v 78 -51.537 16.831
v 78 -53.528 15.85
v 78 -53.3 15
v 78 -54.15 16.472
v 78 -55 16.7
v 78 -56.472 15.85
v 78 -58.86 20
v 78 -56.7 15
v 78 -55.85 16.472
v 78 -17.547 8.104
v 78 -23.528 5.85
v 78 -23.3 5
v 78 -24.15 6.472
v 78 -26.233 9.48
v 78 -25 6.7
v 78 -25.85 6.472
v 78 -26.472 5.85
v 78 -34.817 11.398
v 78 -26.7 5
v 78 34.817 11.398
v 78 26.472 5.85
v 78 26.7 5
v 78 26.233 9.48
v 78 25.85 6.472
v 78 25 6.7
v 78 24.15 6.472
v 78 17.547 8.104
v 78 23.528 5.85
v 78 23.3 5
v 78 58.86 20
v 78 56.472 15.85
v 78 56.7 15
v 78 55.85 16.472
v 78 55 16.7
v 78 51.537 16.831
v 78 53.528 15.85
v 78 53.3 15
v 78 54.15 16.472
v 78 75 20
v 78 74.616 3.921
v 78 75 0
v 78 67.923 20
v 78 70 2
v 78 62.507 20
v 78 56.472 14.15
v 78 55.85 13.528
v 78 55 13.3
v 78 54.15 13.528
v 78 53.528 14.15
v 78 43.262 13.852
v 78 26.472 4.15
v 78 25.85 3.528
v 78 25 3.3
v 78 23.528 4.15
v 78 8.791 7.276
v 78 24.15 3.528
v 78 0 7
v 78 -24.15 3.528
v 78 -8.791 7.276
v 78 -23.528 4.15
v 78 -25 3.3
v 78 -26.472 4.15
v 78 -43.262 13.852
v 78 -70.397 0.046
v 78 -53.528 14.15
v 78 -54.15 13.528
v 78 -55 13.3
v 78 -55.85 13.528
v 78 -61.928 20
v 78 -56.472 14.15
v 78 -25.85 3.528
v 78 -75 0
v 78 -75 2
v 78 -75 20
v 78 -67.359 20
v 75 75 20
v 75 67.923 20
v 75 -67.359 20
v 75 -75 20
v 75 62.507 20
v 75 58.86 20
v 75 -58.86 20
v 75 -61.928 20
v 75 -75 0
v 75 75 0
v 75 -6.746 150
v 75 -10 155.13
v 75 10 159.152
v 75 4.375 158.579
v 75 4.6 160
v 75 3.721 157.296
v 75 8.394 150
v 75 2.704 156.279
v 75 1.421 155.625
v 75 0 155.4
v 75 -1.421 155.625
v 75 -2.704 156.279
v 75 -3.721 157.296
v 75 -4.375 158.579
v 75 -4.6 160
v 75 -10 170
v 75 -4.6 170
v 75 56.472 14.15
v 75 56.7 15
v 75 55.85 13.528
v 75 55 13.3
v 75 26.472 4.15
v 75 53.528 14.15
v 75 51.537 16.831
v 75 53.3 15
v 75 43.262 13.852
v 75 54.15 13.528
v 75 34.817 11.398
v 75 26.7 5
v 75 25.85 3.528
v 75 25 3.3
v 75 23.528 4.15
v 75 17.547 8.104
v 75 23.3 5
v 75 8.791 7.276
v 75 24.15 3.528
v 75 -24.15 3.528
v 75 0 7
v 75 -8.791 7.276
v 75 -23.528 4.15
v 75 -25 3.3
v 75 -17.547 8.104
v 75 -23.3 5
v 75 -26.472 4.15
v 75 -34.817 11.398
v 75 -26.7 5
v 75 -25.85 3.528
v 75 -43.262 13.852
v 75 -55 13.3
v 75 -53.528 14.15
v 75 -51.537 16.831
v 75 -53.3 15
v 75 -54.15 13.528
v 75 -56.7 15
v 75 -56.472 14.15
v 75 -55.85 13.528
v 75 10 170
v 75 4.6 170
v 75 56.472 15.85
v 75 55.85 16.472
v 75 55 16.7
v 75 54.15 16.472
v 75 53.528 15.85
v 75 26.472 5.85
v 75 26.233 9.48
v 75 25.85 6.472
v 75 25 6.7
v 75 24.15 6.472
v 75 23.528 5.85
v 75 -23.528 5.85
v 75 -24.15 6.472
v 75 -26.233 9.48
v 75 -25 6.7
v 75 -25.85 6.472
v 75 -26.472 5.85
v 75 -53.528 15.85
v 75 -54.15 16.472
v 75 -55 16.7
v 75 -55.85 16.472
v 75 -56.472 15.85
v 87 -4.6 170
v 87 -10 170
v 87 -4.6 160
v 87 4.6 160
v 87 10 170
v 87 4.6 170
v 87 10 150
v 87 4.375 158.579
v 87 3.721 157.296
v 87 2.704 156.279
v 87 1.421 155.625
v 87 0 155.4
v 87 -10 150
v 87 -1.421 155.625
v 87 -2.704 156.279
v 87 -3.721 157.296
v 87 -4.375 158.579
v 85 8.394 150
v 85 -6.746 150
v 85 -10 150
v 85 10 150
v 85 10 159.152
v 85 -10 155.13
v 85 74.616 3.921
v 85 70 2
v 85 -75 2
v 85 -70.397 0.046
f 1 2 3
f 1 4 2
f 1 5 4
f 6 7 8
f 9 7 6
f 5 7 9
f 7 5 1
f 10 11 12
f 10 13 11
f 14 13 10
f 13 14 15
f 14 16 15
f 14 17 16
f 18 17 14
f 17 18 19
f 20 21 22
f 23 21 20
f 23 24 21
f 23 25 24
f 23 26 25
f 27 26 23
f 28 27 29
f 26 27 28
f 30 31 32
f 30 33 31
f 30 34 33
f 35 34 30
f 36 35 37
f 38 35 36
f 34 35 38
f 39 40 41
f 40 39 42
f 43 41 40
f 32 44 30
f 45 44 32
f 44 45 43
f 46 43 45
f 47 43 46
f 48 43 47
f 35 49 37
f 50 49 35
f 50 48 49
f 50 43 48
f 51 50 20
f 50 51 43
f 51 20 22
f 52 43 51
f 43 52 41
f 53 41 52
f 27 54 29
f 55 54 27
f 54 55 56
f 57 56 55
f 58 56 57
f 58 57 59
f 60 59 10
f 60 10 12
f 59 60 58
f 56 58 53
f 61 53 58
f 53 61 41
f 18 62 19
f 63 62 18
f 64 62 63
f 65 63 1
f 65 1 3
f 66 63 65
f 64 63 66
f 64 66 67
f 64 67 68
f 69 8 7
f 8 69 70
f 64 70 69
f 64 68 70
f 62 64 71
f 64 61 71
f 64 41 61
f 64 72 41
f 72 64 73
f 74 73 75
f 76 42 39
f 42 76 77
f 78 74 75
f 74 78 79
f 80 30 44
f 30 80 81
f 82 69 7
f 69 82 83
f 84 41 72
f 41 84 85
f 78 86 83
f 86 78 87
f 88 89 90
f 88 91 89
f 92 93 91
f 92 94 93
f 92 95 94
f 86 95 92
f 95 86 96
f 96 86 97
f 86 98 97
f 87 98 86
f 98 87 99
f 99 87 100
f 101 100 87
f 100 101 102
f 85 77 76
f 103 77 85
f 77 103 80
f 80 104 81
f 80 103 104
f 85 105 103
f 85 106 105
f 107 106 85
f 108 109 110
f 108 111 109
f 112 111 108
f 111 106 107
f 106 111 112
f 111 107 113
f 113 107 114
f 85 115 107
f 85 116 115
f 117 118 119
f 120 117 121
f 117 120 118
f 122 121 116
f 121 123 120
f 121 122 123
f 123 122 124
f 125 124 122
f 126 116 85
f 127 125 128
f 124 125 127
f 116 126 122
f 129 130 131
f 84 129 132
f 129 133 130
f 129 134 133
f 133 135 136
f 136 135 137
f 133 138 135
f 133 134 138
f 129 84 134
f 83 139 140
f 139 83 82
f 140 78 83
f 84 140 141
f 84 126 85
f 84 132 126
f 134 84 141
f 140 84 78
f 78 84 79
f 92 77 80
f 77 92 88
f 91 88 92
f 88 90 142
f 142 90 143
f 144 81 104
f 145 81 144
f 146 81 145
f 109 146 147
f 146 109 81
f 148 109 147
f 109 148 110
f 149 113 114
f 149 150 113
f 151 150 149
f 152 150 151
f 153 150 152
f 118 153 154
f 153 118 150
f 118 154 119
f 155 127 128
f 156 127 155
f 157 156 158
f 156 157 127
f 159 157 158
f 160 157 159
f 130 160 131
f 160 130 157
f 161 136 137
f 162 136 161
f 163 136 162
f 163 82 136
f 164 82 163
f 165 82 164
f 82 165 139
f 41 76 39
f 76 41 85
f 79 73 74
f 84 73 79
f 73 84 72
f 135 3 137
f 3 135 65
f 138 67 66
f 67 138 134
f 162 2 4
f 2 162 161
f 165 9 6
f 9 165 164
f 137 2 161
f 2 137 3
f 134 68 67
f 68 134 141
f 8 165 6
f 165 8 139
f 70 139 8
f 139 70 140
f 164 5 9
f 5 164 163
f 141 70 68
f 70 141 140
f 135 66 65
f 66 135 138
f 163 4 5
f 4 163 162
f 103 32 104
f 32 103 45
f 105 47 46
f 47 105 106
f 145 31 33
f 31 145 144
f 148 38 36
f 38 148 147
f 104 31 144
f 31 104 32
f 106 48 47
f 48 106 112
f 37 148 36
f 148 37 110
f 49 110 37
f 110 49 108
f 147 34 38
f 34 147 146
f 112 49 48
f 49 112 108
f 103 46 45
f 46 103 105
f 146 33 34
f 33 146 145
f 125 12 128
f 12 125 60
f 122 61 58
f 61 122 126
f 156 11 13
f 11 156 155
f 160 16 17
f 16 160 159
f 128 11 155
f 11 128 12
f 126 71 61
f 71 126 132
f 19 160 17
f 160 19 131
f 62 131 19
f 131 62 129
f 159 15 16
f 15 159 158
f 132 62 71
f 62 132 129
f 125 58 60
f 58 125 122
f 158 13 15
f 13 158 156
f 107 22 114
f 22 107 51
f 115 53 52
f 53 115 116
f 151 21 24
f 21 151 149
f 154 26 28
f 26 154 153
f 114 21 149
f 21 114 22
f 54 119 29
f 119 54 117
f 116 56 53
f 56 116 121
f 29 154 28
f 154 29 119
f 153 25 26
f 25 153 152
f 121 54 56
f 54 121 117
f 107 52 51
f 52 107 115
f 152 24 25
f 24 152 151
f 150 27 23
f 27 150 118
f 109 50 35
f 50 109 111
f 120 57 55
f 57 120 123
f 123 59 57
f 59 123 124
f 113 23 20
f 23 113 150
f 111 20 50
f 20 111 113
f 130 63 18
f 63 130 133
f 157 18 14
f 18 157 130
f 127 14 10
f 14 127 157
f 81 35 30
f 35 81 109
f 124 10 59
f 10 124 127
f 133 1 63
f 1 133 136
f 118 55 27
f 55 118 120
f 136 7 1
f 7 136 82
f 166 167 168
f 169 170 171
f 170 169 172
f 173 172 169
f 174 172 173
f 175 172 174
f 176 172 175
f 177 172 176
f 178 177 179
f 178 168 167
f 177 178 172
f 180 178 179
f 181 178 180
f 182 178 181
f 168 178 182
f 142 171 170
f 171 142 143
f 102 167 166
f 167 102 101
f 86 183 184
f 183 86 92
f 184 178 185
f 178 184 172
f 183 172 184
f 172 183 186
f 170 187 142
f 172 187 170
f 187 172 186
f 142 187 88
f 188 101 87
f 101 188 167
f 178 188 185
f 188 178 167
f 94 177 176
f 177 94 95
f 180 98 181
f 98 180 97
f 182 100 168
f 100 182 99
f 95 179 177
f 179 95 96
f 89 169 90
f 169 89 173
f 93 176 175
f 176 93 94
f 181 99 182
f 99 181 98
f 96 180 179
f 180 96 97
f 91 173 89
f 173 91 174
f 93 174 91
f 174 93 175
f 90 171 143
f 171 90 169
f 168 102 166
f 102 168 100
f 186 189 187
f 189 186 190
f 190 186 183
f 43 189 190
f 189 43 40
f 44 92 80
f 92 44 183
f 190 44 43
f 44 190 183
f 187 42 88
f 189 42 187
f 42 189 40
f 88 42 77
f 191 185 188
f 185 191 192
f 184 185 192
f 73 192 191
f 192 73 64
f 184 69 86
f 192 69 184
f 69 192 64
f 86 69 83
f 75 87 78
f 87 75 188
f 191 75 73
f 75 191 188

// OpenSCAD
//supportBot();
//supportLeft();
supportRight();

module supportBot(pX=0, pY=0, pZ=0, rX=0, rY=0, rZ=0, size=150, dia=30, Fn=6)
{
    translate([pX-120/2, pY-size/2, pZ])
    rotate([rX, rY, rZ])    
    {
        translate([0,120,0,])
            cube([5, 90, 5]);
        translate([115,120,0,])
            cube([5, 90, 5]);
        translate([0,15,0,])
            cube([120, 5, 5]);
        translate([0,75,0,])
            cube([120, 5, 5]);
        translate([0,130,0,])
            cube([120, 5, 5]);
        difference(){
            translate([0,15,0])
                cube([5,size-30,20]);
            translate([-1,size/2,147])
            rotate([0,90,0])
                cylinder(10,140,140,$fn=100);
            translate([-1,20, 15])
            rotate([0,90,0])
                cylinder(10,1.1,1.1,$fn=12);
            translate([-1,size-20,15])
            rotate([0,90,0])
                cylinder(10,1.1,1.1,$fn=12);
            translate([-1,50, 5])
            rotate([0,90,0])
                cylinder(10,1.1,1.1,$fn=12);
            translate([-1,size-50, 5])
            rotate([0,90,0])
                cylinder(10,1.1,1.1,$fn=12);
        }
        difference(){
            translate([115,15,0])
                cube([5,size-30,20]);
            translate([114,size/2,147])
            rotate([0,90,0])
                cylinder(10,140,140,$fn=100);
            translate([114,20, 15])
            rotate([0,90,0])
                cylinder(10,1.1,1.1,$fn=12);
            translate([114,size-20,15])
            rotate([0,90,0])
                cylinder(10,1.1,1.1,$fn=12);
            translate([114,50, 5])
            rotate([0,90,0])
                cylinder(10,1.1,1.1,$fn=12);
            translate([114,size-50, 5])
            rotate([0,90,0])
                cylinder(10,1.1,1.1,$fn=12);
        }//dif
        
    }//transform
}//axisYHolder

module supportLeft(pX=0, pY=0, pZ=0, rX=0, rY=0, rZ=0, size=150, dia=20, Fn=6)
{
    translate([pX, pY, pZ])
    rotate([rX, rY, rZ+180])    
    {
        supportRight();
        
    }//transform
}//supportLeft


module supportRight(pX=0, pY=0, pZ=0, rX=0, rY=0, rZ=0, size=150, dia=20, Fn=6)
{
    translate([pX+size/2, pY-size/2, pZ])
    rotate([rX, rY, rZ])    
    {   
        difference(){
            cube([3, size, dia]);
            translate([-1,20, 15])
            rotate([0,90,0])
                cylinder(10,1.7,1.7,$fn=12);
            translate([-1,size-20,15])
            rotate([0,90,0])
                cylinder(10,1.7,1.7,$fn=12);
            translate([-1,50, 5])
            rotate([0,90,0])
                cylinder(10,1.7,1.7,$fn=12);
            translate([-1,size-50, 5])
            rotate([0,90,0])
                cylinder(10,1.7,1.7,$fn=12);
            translate([-3,size/2,147])
            rotate([0,90,0])
                cylinder(10,140,140,$fn=100);
        }
        
        
        difference(){
            translate([0,size/2-dia/2,150])
                cube([12,dia,dia]);
            translate([-1,size/2,160])
            rotate([0,90,0])
                cylinder(15, 4.6, 4.6, $fn=20);
            translate([-1,size/2-4.6,160])
                cube([20,9.2,20]);
        }//dif
        
        translate([0,size-5,2])
        rotate([22.6,0,0])
            cube([10,5,170]);
        translate([0,0,2])
        rotate([-23,0,0])
            cube([10,5,170]);
    }//transform
}//supportRIght
